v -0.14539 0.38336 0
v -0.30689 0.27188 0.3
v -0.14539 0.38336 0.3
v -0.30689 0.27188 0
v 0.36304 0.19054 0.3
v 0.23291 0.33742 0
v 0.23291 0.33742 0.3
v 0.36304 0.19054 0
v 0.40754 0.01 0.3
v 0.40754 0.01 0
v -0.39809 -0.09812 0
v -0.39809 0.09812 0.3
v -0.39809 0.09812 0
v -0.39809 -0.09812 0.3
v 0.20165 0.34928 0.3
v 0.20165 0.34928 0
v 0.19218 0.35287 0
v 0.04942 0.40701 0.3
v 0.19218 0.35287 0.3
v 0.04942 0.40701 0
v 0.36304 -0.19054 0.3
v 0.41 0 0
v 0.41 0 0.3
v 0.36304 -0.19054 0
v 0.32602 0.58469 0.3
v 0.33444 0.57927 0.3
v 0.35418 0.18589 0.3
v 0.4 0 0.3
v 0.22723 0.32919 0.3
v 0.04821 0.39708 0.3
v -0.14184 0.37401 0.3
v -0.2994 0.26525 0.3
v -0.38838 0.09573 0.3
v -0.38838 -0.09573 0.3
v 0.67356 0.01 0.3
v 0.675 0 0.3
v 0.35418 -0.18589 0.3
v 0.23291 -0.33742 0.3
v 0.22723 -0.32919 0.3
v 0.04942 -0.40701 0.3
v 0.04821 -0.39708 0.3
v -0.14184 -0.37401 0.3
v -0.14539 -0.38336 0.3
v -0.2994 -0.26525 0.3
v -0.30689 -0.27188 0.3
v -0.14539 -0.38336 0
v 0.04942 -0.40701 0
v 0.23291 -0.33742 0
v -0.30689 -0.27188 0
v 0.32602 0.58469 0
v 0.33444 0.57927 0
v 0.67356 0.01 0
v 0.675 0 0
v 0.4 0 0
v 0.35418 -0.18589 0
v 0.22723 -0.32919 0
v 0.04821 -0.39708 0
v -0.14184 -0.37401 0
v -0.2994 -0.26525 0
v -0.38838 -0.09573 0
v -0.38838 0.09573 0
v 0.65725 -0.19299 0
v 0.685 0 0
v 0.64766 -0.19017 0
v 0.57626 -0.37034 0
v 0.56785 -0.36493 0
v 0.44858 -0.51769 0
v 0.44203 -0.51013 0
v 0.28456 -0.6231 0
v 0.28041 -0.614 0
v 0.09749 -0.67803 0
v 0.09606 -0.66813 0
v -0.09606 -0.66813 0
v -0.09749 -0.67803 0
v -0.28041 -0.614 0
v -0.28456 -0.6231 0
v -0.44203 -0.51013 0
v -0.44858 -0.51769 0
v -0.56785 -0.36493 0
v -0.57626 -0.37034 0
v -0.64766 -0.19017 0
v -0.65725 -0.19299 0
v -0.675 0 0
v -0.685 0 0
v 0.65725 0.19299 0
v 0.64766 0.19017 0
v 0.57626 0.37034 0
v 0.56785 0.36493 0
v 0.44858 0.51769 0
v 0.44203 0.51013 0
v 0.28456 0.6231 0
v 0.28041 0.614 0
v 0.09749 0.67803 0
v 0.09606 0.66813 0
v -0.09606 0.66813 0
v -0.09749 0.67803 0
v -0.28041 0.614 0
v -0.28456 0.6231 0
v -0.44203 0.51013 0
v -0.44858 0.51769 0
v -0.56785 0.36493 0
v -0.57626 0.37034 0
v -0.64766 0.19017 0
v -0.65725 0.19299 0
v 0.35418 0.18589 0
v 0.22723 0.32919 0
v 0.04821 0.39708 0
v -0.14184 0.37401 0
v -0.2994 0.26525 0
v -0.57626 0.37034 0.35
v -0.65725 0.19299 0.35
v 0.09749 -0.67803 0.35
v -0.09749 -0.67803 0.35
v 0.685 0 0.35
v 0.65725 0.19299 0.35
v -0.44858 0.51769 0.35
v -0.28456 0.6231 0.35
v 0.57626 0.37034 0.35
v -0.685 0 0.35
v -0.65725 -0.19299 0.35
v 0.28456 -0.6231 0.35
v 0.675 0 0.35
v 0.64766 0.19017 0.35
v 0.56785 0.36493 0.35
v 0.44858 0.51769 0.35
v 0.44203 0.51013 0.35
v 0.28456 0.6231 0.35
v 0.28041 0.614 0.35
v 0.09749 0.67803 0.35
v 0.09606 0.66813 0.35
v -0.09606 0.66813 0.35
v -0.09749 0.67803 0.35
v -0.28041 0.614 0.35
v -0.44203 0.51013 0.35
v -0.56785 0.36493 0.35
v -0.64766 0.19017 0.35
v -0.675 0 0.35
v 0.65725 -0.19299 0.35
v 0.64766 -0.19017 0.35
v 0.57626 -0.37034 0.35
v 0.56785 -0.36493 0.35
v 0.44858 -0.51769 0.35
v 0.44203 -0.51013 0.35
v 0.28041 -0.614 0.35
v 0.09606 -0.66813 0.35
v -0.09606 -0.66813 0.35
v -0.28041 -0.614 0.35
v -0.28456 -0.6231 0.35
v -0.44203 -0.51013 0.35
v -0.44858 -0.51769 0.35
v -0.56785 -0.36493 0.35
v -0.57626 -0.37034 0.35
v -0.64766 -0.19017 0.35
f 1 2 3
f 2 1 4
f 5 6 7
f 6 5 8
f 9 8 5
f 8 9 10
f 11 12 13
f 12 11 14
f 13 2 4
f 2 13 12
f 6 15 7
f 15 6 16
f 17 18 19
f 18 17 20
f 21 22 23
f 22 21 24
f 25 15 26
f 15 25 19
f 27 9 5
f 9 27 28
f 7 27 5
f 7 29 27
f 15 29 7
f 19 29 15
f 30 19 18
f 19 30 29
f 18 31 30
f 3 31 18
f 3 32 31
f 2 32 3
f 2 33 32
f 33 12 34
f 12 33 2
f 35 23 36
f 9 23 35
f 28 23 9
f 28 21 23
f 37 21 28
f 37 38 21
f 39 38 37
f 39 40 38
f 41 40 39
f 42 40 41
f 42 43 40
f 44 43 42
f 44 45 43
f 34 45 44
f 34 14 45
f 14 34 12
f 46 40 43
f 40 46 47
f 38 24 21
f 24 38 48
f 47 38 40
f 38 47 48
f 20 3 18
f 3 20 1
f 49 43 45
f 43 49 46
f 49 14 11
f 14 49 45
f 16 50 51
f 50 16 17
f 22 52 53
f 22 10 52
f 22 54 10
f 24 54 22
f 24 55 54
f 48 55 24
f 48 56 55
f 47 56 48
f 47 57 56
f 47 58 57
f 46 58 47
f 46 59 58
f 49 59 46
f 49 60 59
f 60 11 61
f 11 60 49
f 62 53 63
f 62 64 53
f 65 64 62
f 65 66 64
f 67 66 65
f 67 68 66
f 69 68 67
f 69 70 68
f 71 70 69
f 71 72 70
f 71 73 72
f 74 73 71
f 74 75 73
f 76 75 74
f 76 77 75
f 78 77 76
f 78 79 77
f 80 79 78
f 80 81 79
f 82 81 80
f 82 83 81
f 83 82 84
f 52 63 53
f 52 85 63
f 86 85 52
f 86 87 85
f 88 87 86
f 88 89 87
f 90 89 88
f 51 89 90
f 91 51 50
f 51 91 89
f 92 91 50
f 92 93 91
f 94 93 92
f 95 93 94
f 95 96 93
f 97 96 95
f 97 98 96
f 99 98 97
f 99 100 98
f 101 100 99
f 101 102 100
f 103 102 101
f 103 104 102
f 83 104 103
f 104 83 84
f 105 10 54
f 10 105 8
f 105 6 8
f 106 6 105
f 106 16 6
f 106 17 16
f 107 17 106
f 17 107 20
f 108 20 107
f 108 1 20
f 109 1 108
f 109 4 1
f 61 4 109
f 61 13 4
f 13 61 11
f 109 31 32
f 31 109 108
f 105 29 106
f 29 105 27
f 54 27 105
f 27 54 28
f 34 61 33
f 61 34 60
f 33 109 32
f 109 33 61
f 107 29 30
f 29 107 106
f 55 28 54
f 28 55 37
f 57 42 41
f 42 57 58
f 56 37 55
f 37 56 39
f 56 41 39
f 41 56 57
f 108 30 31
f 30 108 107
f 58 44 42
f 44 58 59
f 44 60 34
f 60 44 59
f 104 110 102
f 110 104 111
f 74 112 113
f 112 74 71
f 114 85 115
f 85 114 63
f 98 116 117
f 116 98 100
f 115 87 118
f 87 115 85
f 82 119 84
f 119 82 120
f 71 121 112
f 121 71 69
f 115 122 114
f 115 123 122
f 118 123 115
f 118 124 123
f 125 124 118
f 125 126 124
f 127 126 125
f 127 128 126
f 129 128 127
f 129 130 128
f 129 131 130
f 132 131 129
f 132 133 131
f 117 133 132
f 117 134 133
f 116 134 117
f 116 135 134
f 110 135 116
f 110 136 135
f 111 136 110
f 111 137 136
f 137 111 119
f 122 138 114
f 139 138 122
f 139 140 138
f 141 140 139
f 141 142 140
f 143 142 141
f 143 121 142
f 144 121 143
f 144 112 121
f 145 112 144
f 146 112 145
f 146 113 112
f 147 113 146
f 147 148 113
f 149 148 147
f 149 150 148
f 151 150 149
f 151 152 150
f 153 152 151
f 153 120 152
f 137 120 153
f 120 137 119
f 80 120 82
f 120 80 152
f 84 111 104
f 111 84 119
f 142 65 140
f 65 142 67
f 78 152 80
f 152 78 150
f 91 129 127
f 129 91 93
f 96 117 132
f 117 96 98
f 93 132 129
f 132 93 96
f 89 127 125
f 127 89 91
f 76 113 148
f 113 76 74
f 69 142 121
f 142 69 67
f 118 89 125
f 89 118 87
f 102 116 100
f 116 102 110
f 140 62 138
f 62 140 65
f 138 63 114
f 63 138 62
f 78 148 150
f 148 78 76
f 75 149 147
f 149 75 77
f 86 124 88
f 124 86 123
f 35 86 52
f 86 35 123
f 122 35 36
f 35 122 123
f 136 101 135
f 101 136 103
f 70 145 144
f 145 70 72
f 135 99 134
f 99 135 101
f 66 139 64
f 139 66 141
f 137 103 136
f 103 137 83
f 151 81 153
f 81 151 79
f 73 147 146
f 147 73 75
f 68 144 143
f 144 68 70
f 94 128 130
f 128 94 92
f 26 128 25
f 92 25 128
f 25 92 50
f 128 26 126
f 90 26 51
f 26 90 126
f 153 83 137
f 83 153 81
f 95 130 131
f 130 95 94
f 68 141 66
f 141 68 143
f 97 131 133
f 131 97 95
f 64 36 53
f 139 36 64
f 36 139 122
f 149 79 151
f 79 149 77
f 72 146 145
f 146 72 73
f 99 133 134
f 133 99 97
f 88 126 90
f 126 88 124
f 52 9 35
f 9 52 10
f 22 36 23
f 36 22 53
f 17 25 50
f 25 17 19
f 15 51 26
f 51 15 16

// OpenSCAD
$vpd=4;
pi=3.14;
innerH=3;   innerR=4;
outerH=3.5; outerR=6.75;
dik=.1;
hoek=60;
module ring(h, r)
{
  difference() {
    cylinder(h=h, r=r+dik);
    translate([0,0,-5])
      cylinder(h=h+10, r=r); // negative object higher
  }
}

module muur(hoek) {
  rotate([0,0,hoek])
    translate([innerR,0,0])
      cube([outerR-innerR, dik, innerH]);
}

module biogas()
{
  scale(v=[.1,.1,.1]) {
    union() {
      ring(innerH, innerR);
      ring(outerH, outerR);
      muur(0);
      muur(hoek);
    }
  }
}
biogas();
function betonRing (dia, dik) = let(r=dia+dik) (r*r - dia*dia) * pi * innerH;
function betonMuur() = 2 * dik * innerH * (outerR-innerR);
function inner3(r, h, hoek) = h * hoek / 360 * r * r * pi;
function ring3(angle) = inner3(outerR, innerH, angle) - inner3(innerR+dik, innerH, angle);

e="euro";
baksteen=.23;
gasbetonM3 = 0.6*0.4*0.05;
steenM2 = 78*.21*.05;
specieM2 = dik*(1-steenM2)*1.5;
murenM3=betonMuur();
ringM3=betonRing(innerR, dik);
beton=murenM3+ringM3;
aantalM2=beton/dik;
aantalBakstenen=beton/dik*78; //stenenPerM2=78
echo(murenM3=betonMuur());
echo(ringM3=betonRing(innerR, dik));
echo(innerM3=inner3(innerR, innerH, 360));
echo(plugflowM3=ring3(360-hoek));
echo(effluentM3=ring3(hoek));
echo(beton=beton, prijs=120*beton);
echo(gasbetonM3=gasbetonM3, prijs=1.8*beton/gasbetonM3);
echo(perM2=78*baksteen, aantalM2=aantalM2, stuks=aantalBakstenen);
echo(steenM2=steenM2, specieM2=specieM2);
baksteenKosten=aantalBakstenen*baksteen;
specieKosten=specieM2*aantalM2/12*3.9*1000;
echo(allesM2=baksteenKosten, specie=specieKosten);
echo(materiaalKosten=specieKosten+baksteenKosten);
echo(serreMuurPerM2=1700, e);
echo(totalM3=inner3(outerR, innerH, 360));
echo(betonplaten=100/2.40/1.20*2);
echo("https://www.123betonbestellen.nl/berekenen");
